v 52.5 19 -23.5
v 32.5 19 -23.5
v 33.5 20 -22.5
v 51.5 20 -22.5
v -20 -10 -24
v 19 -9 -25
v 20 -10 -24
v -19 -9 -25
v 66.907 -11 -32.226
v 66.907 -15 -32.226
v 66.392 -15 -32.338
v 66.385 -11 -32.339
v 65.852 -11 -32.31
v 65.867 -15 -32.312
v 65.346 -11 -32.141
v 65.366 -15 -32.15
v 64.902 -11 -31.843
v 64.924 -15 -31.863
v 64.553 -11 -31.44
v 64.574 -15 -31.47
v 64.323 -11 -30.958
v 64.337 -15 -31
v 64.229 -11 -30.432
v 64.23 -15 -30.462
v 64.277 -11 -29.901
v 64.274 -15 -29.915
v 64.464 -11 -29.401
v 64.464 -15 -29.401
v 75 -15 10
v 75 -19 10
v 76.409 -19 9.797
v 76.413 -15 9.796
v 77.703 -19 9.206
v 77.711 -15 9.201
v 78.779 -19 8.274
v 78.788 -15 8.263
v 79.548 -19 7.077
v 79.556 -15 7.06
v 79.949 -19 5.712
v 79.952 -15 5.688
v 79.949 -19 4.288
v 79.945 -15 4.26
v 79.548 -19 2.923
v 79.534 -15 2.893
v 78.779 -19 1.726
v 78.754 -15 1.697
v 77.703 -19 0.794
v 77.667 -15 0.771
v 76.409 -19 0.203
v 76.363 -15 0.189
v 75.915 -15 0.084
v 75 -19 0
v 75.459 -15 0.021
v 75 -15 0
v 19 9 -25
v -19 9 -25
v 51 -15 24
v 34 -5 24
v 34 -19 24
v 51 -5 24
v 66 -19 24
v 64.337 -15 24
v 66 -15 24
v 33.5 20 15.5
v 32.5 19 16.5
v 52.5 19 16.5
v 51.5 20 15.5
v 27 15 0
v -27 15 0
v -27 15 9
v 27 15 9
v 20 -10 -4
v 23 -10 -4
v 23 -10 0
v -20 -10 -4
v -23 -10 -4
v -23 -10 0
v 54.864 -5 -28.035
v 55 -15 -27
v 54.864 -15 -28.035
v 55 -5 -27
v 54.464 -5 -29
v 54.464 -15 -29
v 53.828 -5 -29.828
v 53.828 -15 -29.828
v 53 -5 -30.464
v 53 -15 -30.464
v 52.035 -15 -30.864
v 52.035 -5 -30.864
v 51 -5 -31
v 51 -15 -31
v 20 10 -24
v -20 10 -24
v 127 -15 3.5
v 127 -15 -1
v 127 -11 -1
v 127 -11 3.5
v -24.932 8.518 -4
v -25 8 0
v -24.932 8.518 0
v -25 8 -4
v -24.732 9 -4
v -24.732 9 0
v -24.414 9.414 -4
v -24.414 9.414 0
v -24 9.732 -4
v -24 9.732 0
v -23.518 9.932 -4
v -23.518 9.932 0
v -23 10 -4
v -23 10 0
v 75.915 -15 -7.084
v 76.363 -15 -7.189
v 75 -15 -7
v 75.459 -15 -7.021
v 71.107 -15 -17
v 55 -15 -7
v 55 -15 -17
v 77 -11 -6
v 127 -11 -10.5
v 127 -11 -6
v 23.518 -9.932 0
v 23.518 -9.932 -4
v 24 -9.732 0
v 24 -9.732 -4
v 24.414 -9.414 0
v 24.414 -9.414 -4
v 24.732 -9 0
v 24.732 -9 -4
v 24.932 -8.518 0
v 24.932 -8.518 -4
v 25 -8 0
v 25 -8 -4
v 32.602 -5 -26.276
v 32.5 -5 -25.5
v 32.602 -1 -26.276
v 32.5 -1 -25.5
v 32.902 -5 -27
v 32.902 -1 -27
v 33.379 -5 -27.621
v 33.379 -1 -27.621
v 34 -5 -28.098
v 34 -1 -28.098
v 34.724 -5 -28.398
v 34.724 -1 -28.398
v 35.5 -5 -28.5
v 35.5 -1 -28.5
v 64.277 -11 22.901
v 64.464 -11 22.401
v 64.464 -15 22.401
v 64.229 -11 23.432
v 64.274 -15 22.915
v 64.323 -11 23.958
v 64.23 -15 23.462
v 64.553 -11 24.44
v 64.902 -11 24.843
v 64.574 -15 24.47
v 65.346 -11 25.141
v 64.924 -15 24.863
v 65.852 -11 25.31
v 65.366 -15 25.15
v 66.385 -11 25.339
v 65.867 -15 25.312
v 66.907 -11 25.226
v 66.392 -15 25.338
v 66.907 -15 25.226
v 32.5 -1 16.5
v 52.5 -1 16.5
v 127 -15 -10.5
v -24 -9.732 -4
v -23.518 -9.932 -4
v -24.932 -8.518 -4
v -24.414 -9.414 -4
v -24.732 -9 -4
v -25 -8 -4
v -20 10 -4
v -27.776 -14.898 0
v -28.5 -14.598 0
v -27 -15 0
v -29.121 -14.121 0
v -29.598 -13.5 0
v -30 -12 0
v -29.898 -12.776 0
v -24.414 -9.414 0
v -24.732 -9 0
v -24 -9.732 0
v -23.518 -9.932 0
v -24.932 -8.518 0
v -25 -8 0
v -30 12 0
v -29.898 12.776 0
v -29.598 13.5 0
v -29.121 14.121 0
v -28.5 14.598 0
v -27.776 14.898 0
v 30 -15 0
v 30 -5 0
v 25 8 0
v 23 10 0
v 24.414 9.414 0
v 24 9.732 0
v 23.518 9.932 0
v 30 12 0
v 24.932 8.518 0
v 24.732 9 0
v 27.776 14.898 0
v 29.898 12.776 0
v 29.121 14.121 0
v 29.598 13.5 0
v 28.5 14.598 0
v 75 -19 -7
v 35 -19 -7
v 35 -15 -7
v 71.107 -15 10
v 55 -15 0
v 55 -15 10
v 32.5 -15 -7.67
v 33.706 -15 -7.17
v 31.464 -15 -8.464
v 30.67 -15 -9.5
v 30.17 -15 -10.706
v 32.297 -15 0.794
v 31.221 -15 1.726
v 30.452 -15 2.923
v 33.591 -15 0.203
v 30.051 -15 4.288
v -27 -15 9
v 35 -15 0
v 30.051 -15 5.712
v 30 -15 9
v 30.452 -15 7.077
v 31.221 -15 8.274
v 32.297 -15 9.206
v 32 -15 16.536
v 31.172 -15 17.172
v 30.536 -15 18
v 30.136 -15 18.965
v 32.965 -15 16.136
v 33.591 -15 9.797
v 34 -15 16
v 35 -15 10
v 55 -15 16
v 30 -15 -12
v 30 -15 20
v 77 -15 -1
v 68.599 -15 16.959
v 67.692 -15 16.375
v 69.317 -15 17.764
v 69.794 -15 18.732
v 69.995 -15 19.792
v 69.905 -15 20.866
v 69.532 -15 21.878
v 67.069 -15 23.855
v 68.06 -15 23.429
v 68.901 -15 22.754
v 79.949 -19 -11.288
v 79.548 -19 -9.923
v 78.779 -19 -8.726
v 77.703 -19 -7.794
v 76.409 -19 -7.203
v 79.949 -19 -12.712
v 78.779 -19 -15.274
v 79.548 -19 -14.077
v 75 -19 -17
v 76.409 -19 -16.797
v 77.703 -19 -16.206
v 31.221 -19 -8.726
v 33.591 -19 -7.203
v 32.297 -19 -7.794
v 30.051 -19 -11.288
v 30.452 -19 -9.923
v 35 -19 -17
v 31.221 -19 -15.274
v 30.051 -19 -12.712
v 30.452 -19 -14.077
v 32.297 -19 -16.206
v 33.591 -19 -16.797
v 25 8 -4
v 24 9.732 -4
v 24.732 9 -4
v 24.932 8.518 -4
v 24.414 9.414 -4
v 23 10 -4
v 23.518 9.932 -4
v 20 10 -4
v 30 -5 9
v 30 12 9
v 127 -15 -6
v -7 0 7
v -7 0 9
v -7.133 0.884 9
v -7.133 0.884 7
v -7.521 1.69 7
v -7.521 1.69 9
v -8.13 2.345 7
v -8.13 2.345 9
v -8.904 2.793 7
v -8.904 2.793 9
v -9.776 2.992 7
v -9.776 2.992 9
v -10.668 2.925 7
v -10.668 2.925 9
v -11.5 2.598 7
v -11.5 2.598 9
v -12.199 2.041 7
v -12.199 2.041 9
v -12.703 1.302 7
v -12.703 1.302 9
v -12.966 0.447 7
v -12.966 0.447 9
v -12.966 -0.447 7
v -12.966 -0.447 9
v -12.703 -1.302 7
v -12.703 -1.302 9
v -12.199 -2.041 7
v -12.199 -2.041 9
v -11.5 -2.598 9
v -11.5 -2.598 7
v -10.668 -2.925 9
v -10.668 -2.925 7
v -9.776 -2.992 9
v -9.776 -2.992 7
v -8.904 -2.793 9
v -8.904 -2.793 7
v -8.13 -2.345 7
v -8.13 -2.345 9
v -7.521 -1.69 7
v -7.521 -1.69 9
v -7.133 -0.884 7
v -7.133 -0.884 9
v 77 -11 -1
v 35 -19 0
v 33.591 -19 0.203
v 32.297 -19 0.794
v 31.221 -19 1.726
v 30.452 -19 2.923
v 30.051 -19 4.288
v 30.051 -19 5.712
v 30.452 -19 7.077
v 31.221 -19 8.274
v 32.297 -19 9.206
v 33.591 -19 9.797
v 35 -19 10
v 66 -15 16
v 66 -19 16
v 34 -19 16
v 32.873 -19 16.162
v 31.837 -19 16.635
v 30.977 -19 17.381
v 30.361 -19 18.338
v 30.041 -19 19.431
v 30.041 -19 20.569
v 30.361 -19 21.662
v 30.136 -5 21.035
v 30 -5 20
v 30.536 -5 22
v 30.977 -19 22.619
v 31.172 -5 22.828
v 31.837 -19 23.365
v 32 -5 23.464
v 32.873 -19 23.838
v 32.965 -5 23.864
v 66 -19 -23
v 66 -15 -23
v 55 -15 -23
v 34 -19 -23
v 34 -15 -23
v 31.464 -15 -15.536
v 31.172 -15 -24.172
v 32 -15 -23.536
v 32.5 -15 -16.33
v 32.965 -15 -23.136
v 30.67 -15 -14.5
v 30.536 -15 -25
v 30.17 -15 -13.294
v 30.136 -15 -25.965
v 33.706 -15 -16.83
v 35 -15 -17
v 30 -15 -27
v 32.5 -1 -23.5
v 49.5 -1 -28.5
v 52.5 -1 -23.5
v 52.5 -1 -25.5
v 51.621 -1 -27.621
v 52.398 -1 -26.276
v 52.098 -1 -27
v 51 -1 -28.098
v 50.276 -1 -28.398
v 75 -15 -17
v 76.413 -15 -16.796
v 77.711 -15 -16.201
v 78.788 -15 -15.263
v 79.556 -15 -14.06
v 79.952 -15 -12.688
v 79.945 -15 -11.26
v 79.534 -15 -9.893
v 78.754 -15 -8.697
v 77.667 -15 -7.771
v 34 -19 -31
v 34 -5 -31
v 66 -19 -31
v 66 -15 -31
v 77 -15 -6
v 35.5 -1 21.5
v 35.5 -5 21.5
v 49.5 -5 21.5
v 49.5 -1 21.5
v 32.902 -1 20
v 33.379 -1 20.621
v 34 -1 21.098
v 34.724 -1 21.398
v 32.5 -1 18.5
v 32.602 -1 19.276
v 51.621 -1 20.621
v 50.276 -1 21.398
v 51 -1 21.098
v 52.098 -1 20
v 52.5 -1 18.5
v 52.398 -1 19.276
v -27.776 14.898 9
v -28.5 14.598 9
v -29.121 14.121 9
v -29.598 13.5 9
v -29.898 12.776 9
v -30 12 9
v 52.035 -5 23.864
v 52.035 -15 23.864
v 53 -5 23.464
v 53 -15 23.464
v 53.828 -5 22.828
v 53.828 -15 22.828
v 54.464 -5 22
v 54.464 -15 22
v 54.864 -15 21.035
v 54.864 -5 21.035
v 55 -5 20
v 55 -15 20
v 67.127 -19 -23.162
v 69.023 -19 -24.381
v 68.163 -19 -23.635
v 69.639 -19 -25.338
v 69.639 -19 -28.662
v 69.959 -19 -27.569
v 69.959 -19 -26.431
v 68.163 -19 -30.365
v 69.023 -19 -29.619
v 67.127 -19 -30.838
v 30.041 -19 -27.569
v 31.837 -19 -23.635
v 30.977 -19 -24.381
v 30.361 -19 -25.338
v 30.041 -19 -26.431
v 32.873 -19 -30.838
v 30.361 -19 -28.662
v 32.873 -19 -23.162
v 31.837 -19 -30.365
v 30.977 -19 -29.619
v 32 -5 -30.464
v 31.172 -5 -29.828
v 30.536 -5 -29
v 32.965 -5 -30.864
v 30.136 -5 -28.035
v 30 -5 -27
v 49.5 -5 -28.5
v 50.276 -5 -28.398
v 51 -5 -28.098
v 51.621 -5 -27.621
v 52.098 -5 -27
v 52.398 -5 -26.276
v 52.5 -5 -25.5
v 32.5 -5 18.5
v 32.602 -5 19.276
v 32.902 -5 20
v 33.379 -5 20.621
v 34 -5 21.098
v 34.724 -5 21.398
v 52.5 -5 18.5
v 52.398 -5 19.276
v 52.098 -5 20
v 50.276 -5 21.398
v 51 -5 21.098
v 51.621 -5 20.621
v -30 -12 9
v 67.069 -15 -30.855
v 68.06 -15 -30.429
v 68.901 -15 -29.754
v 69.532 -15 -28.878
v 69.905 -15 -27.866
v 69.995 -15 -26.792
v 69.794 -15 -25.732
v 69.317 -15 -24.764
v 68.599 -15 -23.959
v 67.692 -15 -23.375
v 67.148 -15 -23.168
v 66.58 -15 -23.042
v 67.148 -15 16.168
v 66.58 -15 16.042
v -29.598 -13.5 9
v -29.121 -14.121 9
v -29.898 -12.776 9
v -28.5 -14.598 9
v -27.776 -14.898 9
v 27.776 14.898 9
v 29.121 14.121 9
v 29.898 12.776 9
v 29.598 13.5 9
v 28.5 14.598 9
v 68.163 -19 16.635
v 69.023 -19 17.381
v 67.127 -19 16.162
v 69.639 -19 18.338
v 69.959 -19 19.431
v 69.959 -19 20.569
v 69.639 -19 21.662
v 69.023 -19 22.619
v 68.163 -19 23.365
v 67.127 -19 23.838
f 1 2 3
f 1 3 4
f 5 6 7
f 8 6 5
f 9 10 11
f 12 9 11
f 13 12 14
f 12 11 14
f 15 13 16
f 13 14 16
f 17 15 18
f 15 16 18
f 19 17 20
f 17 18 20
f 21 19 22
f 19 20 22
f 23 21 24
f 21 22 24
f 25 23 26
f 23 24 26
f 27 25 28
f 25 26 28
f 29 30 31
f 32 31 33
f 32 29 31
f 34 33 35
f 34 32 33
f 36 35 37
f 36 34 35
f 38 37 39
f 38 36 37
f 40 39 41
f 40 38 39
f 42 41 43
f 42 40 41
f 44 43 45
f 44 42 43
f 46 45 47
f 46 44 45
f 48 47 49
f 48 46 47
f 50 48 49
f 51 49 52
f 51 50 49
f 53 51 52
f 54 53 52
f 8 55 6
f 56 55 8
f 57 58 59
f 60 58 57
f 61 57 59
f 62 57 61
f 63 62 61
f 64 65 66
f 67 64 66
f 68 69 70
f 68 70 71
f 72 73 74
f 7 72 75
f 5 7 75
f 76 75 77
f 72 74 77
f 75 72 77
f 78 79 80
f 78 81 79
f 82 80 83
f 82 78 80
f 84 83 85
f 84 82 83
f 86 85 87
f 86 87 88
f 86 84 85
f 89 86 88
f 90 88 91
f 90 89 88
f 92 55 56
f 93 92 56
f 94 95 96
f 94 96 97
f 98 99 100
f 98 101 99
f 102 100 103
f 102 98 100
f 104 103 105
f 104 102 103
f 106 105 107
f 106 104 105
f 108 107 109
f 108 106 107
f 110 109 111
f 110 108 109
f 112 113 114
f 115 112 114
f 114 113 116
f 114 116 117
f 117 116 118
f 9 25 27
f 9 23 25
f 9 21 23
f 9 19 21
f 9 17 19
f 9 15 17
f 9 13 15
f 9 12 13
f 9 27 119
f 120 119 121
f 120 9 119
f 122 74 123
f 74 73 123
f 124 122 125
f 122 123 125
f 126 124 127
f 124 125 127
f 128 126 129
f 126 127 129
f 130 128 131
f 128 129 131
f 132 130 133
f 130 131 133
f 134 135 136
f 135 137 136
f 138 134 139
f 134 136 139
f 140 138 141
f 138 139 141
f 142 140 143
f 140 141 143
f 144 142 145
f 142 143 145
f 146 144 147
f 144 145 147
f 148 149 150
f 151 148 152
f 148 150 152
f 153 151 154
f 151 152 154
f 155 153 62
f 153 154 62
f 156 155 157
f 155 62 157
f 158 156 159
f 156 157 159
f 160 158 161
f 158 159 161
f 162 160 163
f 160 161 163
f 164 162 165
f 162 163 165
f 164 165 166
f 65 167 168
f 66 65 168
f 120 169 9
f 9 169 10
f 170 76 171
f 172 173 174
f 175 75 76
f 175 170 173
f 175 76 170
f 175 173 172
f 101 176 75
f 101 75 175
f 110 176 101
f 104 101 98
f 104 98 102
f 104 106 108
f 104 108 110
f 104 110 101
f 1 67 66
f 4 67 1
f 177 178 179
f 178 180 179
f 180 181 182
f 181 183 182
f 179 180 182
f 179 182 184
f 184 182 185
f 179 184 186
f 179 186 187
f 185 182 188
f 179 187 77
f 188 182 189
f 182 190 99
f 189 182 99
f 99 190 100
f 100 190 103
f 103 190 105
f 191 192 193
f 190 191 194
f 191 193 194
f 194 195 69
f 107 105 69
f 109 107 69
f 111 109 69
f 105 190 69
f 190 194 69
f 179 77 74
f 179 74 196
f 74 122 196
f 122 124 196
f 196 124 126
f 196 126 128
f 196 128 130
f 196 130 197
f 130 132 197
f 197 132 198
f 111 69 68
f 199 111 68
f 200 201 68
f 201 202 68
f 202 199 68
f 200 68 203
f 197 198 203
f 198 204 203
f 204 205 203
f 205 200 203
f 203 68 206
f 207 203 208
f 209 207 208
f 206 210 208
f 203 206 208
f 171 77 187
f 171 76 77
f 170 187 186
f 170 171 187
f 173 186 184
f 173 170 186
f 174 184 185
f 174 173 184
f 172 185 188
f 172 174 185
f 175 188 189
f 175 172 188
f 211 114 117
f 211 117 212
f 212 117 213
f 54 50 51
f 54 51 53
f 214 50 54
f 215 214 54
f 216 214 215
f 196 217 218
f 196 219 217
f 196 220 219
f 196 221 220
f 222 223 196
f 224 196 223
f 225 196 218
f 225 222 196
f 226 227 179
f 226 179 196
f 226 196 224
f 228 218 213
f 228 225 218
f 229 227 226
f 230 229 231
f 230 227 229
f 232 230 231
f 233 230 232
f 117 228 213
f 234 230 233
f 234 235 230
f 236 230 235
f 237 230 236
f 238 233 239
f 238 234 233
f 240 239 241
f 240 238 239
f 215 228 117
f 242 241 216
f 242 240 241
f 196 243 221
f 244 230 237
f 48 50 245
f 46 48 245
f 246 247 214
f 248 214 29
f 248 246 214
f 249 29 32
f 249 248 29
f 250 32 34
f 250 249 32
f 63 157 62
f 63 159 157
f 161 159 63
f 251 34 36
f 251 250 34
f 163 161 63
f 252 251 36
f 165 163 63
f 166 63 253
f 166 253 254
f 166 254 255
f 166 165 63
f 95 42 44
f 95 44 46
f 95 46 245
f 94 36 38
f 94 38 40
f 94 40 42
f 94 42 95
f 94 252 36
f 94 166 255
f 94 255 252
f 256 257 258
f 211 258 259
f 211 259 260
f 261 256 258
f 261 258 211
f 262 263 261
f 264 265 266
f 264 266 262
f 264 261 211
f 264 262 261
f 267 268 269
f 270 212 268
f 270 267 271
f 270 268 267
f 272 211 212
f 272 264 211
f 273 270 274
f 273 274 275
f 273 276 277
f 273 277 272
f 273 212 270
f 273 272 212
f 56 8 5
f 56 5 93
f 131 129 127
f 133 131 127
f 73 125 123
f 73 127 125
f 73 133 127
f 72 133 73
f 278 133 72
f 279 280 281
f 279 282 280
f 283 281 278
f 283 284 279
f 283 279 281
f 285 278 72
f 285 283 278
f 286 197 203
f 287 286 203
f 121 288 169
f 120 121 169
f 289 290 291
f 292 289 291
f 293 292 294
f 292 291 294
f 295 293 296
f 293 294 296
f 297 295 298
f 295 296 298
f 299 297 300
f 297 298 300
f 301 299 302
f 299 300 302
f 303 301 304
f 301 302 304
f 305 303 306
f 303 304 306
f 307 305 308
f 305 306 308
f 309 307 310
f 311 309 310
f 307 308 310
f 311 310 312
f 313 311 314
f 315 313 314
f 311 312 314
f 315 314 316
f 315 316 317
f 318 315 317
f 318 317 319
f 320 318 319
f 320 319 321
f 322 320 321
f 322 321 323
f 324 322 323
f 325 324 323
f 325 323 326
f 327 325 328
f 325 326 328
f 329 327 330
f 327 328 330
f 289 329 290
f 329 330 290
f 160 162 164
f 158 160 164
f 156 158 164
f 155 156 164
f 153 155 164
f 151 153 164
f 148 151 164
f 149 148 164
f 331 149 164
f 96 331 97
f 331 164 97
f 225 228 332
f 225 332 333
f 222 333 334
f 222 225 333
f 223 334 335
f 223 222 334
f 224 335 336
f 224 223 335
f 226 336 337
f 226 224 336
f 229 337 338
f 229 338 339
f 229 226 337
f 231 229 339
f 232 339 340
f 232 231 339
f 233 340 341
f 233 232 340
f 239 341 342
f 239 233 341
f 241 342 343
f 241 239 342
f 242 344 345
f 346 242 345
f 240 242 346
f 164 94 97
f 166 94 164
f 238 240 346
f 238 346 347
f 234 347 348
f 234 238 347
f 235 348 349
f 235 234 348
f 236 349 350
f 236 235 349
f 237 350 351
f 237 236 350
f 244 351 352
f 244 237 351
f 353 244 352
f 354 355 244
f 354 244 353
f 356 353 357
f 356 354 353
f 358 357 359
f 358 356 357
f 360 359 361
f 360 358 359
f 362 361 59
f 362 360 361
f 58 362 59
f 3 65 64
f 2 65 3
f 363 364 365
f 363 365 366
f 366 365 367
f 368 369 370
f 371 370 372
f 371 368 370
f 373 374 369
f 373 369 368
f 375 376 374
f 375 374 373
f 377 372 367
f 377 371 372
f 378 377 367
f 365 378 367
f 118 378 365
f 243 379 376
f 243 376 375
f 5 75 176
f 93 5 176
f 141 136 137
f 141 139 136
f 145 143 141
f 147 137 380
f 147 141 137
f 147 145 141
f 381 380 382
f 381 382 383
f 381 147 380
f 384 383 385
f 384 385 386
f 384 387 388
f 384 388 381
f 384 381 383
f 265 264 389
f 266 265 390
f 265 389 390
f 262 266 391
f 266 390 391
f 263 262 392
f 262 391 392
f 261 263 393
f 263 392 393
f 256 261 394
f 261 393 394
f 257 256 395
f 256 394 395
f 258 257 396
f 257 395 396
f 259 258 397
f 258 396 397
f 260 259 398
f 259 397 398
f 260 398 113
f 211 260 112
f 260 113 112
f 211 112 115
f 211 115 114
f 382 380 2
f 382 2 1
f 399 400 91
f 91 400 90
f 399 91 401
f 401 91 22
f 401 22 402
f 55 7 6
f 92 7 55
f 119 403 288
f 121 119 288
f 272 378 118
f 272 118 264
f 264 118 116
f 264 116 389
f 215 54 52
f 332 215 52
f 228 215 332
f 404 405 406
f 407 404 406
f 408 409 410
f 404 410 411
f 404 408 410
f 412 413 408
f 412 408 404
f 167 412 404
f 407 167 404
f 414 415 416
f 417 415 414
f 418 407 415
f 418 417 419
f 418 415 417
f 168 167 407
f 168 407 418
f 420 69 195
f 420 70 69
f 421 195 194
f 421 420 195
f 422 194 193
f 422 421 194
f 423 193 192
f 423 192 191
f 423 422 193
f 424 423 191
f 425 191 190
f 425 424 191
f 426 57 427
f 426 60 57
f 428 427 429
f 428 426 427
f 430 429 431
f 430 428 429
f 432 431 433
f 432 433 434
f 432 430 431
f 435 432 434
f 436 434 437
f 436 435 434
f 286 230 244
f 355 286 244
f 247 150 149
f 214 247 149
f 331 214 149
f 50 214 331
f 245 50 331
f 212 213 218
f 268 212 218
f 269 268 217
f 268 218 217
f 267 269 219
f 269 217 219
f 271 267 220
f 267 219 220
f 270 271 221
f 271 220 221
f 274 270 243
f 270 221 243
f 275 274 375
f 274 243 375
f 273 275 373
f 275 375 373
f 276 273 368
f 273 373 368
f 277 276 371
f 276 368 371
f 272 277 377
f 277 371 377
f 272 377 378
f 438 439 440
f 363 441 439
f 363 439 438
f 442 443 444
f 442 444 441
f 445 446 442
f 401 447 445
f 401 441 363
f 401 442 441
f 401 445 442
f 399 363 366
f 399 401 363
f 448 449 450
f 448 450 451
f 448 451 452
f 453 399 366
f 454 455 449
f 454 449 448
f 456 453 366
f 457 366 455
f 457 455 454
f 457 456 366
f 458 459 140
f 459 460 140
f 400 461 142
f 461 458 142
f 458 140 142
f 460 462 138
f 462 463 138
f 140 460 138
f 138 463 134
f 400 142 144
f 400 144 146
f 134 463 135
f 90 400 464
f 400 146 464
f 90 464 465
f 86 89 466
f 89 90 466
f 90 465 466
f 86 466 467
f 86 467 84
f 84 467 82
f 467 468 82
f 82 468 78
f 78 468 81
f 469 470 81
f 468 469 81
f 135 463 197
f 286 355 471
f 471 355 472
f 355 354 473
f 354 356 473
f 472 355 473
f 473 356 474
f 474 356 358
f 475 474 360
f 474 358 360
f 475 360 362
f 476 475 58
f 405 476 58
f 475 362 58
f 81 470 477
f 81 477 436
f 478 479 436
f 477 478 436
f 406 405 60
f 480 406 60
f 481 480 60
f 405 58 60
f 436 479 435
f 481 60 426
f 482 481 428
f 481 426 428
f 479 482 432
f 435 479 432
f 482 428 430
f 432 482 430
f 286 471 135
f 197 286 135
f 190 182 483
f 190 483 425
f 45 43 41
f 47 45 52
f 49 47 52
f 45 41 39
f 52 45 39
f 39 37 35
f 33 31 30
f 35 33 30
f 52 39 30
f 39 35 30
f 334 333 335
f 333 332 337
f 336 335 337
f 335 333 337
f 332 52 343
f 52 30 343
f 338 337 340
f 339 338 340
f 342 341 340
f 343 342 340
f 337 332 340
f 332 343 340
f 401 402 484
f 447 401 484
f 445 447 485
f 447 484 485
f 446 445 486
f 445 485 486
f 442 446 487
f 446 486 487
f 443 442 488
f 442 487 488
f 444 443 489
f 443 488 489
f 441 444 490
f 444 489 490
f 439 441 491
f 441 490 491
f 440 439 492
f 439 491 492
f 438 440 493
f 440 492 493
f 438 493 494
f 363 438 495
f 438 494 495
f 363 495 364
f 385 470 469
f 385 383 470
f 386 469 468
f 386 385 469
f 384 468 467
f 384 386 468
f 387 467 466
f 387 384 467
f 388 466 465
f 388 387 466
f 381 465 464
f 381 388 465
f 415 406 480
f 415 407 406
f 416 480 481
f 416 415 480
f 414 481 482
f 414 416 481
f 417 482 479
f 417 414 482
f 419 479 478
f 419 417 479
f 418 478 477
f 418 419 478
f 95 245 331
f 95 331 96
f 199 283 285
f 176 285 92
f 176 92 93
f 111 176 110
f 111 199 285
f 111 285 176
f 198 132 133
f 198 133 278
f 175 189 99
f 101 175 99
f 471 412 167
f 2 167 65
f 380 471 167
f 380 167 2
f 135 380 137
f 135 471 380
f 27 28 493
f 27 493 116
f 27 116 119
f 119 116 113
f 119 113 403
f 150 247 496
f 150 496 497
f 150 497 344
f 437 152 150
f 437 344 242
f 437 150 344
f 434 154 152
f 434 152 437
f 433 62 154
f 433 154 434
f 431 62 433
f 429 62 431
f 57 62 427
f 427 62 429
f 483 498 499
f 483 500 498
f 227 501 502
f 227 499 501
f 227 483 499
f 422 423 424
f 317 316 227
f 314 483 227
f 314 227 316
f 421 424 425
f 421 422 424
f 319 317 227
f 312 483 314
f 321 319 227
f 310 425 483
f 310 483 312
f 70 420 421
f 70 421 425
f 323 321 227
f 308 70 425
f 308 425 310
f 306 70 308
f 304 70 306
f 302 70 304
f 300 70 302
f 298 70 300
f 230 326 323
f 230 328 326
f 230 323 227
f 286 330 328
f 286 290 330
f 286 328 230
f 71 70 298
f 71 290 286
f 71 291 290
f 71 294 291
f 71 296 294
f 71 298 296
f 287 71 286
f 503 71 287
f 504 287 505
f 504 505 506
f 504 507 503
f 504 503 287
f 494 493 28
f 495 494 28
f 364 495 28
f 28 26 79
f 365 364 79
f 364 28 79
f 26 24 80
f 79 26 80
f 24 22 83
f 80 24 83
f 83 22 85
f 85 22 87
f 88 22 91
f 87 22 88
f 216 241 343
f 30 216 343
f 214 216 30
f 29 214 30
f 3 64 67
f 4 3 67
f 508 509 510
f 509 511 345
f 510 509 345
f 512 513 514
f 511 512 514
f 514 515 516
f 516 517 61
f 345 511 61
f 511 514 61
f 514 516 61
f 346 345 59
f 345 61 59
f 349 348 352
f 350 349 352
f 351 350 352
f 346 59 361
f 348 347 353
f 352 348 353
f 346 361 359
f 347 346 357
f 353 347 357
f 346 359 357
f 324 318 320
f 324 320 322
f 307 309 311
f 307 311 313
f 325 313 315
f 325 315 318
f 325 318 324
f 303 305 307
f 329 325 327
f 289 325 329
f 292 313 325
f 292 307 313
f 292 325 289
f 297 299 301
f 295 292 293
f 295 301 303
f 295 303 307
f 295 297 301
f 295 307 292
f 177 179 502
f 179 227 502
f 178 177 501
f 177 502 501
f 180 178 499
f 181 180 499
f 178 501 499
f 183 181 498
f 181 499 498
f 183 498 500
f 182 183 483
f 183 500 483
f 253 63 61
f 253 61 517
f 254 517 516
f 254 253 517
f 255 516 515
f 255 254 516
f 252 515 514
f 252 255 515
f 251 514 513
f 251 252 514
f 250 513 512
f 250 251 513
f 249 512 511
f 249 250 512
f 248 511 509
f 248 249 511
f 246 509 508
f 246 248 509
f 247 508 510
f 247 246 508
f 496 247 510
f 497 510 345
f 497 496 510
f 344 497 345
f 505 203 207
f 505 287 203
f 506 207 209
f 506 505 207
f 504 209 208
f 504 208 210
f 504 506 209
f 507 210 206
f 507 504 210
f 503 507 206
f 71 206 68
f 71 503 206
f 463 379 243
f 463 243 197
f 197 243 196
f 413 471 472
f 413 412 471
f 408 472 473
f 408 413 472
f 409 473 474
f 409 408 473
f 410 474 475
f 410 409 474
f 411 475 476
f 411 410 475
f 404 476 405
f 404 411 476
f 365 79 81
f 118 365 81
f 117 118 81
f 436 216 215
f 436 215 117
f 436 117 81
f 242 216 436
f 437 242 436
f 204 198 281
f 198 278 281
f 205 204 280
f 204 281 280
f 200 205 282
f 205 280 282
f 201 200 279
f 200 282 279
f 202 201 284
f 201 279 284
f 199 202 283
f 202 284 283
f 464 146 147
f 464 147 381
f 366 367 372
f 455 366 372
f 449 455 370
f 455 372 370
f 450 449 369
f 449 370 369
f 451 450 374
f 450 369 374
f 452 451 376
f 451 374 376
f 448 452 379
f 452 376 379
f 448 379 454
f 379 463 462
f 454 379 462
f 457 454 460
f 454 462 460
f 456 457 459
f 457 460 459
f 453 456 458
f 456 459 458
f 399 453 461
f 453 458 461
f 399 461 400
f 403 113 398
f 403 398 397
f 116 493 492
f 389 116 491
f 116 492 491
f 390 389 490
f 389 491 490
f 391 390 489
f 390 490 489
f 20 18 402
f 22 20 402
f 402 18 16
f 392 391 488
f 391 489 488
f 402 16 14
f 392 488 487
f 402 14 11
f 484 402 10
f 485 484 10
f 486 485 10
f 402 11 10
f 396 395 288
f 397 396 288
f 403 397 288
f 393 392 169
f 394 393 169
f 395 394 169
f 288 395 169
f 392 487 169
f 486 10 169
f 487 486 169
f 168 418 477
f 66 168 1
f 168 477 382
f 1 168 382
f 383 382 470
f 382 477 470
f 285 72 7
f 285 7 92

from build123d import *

# Parameters (mm, degrees)
SKETCH_1_W          = 60
SKETCH_1_H          = 30
EXTRUDE_1_DEPTH     = 9
SKETCH_2_W          = 25
SKETCH_2_H          = 55
EXTRUDE_2_DEPTH     = 10
SKETCH_3_W          = 20
SKETCH_3_H          = 40
EXTRUDE_3_DEPTH     = 25
SKETCH_4_W          = 20
SKETCH_4_H          = 5
EXTRUDE_4_DEPTH     = 4
FILLET_1_R          = 4
FILLET_2_R          = 3
FILLET_3_R          = 3
EXTRUDE_5_DEPTH     = 4
EXTRUDE_6_DEPTH     = 4
FILLET_4_R          = 2
CHAMFER_1_SIZE      = 1
SKETCH_7_W          = 40
SKETCH_7_H          = 20
EXTRUDE_7_DEPTH     = 25
SKETCH_8_W          = 5
SKETCH_8_H          = 20
EXTRUDE_8_DEPTH     = 4
CHAMFER_2_SIZE      = 1
FILLET_6_R          = 2
SKETCH_9_R          = 3
CUT_EXTRUDE_1_DEPTH = 2


with BuildPart() as part:
    # 草图1 → 凸台-拉伸1 (new body)
    with BuildSketch(Plane.XY):
        Rectangle(SKETCH_1_W, SKETCH_1_H)
    extrude(amount=EXTRUDE_1_DEPTH)

    # 草图2 → 凸台-拉伸2 (add)
    with BuildSketch(Plane.XZ.offset(15)):
        with Locations((42.5, -3.5)):
            Rectangle(SKETCH_2_W, SKETCH_2_H)
    extrude(amount=-EXTRUDE_2_DEPTH)

    # 草图3 → 凸台-拉伸3 (add)
    with BuildSketch(Plane(origin=(0, -5, 0), x_dir=(1, 0, 0), z_dir=(0, 1, 0))):
        with Locations((42.5, 3.5)):
            Rectangle(SKETCH_3_W, SKETCH_3_H)
    extrude(amount=EXTRUDE_3_DEPTH)

    # 草图4 → 凸台-拉伸4 (add)
    with BuildSketch(Plane(origin=(0, -5, 0), x_dir=(1, 0, 0), z_dir=(0, 1, 0))):
        with Locations((42.5, 26)):
            Rectangle(SKETCH_4_W, SKETCH_4_H)
        with Locations((42.5, -19)):
            Rectangle(SKETCH_4_W, SKETCH_4_H)
    extrude(amount=EXTRUDE_4_DEPTH)

    # 圆角1
    fillet_1_edges = [part.edges().sort_by_distance(p)[0] for p in [
        (30, -10, -31),
        (30, -10, 24),
        (55, -10, 24),
        (55, -10, -31),
    ]]
    fillet(fillet_1_edges, radius=FILLET_1_R)

    # 圆角2
    fillet_2_edges = [part.edges().sort_by_distance(p)[0] for p in [
        (52.5, -3, -28.5),
        (32.5, -3, -28.5),
        (52.5, -3, 21.5),
        (32.5, -3, 21.5),
    ]]
    fillet(fillet_2_edges, radius=FILLET_2_R)

    # 圆角3
    fillet_3_edges = [part.edges().sort_by_distance(p)[0] for p in [
        (-30, -15, 4.5),
        (-30, 15, 4.5),
        (30, 15, 4.5),
    ]]
    fillet(fillet_3_edges, radius=FILLET_3_R)

    # 草图5 → 凸台-拉伸5 (add)
    with BuildSketch(Plane.XZ.offset(15)):
        with BuildLine():
            Line((34, 24), (66, 24))
            ThreePointArc((66, 24), (70, 20), (66, 16))
            Line((66, 16), (34, 16))
            ThreePointArc((34, 16), (30, 20), (34, 24))
        make_face()
        with BuildLine():
            Line((35, 10), (75, 10))
            ThreePointArc((75, 10), (80, 5), (75, 0))
            Line((75, 0), (35, 0))
            ThreePointArc((35, 0), (30, 5), (35, 10))
        make_face()
    extrude_5 = extrude(amount=EXTRUDE_5_DEPTH)

    # 镜向1: 凸台-拉伸5 across plane
    add(extrude_5.mirror(Plane(origin=(0, 0, -3.5), x_dir=(1, 0, 0), z_dir=(0, 0, -1))))

    # 草图6 → 凸台-拉伸6 (add)
    with BuildSketch(Plane(origin=(0, -15, 0), x_dir=(1, 0, 0), z_dir=(0, 1, 0))):
        Polygon((62, 34), (77, 6), (127, 6), (127, 10.5), align=None)
    extrude_6 = extrude(amount=EXTRUDE_6_DEPTH)

    # 镜向2: 凸台-拉伸6 across plane
    add(extrude_6.mirror(Plane(origin=(0, 0, -3.5), x_dir=(1, 0, 0), z_dir=(0, 0, -1))))

    # 圆角4
    # the kernel refuses this fillet: 2 mm, written as the material it takes off along each edge
    with BuildSketch(Plane(origin=(62, -15, -34), x_dir=(0.47222141251542, 0, 0.8814799700287814), z_dir=(0, 1, 0))) as fillet_4_piece_1:
        with BuildLine():
            CenterArc((FILLET_4_R * 2.60886248276, FILLET_4_R), FILLET_4_R, 131.944537695, 138.055462305)
            Line((FILLET_4_R * 1.94045155385, FILLET_4_R * 1.74379219551), (0, 0))
            Line((0, 0), (FILLET_4_R * 2.60886248276, 0))
        make_face()
    extrude(amount=17.044312414, mode=Mode.SUBTRACT)
    with BuildSketch(Plane(origin=(62, -15, 27), x_dir=(0.47222141251541977, 0, -0.8814799700287816), z_dir=(0, 1, 0))) as fillet_4_piece_2:
        with BuildLine():
            CenterArc((FILLET_4_R * 2.60886248276, -FILLET_4_R), FILLET_4_R, 90, 138.055462305)
            Line((FILLET_4_R * 1.94045155385, -FILLET_4_R * 1.74379219551), (0, 0))
            Line((0, 0), (FILLET_4_R * 2.60886248276, 0))
        make_face()
    extrude(amount=17.044312414, mode=Mode.SUBTRACT)

    # 倒角1
    chamfer_1_edges = [part.edges().sort_by_distance(p)[0] for p in [
        (32.5, 20, -3.5),
        (42.5, 20, 16.5),
        (52.5, 20, -3.5),
        (42.5, 20, -23.5),
    ]]
    chamfer(chamfer_1_edges, length=CHAMFER_1_SIZE)

    # 草图7 → 凸台-拉伸7 (add)
    with BuildSketch(Plane(origin=(0, 0, 0), x_dir=(-1, 0, 0), z_dir=(0, 0, -1))):
        Rectangle(SKETCH_7_W, SKETCH_7_H)
    extrude(amount=EXTRUDE_7_DEPTH)

    # 草图8 → 凸台-拉伸8 (add)
    with BuildSketch(Plane(origin=(0, 0, 0), x_dir=(-1, 0, 0), z_dir=(0, 0, -1))):
        with Locations((22.5, 0)):
            Rectangle(SKETCH_8_W, SKETCH_8_H)
        with Locations((-22.5, 0)):
            Rectangle(SKETCH_8_W, SKETCH_8_H)
    extrude(amount=EXTRUDE_8_DEPTH)

    # 倒角2
    chamfer_2_edges = [part.edges().sort_by_distance(p)[0] for p in [
        (-20, 0, -25),
        (0, 10, -25),
        (20, 0, -25),
        (0, -10, -25),
    ]]
    chamfer(chamfer_2_edges, length=CHAMFER_2_SIZE)

    # 圆角6
    fillet_6_edges = [part.edges().sort_by_distance(p)[0] for p in [
        (-25, -10, -2),
        (-25, 10, -2),
        (25, 10, -2),
        (25, -10, -2),
    ]]
    fillet(fillet_6_edges, radius=FILLET_6_R)

    # 草图9 → 切除-拉伸1 (cut)
    with BuildSketch(Plane.XY.offset(9)):
        with Locations((-10, 0)):
            Circle(SKETCH_9_R)
    extrude(amount=-CUT_EXTRUDE_1_DEPTH, mode=Mode.SUBTRACT)


solid = part.part
